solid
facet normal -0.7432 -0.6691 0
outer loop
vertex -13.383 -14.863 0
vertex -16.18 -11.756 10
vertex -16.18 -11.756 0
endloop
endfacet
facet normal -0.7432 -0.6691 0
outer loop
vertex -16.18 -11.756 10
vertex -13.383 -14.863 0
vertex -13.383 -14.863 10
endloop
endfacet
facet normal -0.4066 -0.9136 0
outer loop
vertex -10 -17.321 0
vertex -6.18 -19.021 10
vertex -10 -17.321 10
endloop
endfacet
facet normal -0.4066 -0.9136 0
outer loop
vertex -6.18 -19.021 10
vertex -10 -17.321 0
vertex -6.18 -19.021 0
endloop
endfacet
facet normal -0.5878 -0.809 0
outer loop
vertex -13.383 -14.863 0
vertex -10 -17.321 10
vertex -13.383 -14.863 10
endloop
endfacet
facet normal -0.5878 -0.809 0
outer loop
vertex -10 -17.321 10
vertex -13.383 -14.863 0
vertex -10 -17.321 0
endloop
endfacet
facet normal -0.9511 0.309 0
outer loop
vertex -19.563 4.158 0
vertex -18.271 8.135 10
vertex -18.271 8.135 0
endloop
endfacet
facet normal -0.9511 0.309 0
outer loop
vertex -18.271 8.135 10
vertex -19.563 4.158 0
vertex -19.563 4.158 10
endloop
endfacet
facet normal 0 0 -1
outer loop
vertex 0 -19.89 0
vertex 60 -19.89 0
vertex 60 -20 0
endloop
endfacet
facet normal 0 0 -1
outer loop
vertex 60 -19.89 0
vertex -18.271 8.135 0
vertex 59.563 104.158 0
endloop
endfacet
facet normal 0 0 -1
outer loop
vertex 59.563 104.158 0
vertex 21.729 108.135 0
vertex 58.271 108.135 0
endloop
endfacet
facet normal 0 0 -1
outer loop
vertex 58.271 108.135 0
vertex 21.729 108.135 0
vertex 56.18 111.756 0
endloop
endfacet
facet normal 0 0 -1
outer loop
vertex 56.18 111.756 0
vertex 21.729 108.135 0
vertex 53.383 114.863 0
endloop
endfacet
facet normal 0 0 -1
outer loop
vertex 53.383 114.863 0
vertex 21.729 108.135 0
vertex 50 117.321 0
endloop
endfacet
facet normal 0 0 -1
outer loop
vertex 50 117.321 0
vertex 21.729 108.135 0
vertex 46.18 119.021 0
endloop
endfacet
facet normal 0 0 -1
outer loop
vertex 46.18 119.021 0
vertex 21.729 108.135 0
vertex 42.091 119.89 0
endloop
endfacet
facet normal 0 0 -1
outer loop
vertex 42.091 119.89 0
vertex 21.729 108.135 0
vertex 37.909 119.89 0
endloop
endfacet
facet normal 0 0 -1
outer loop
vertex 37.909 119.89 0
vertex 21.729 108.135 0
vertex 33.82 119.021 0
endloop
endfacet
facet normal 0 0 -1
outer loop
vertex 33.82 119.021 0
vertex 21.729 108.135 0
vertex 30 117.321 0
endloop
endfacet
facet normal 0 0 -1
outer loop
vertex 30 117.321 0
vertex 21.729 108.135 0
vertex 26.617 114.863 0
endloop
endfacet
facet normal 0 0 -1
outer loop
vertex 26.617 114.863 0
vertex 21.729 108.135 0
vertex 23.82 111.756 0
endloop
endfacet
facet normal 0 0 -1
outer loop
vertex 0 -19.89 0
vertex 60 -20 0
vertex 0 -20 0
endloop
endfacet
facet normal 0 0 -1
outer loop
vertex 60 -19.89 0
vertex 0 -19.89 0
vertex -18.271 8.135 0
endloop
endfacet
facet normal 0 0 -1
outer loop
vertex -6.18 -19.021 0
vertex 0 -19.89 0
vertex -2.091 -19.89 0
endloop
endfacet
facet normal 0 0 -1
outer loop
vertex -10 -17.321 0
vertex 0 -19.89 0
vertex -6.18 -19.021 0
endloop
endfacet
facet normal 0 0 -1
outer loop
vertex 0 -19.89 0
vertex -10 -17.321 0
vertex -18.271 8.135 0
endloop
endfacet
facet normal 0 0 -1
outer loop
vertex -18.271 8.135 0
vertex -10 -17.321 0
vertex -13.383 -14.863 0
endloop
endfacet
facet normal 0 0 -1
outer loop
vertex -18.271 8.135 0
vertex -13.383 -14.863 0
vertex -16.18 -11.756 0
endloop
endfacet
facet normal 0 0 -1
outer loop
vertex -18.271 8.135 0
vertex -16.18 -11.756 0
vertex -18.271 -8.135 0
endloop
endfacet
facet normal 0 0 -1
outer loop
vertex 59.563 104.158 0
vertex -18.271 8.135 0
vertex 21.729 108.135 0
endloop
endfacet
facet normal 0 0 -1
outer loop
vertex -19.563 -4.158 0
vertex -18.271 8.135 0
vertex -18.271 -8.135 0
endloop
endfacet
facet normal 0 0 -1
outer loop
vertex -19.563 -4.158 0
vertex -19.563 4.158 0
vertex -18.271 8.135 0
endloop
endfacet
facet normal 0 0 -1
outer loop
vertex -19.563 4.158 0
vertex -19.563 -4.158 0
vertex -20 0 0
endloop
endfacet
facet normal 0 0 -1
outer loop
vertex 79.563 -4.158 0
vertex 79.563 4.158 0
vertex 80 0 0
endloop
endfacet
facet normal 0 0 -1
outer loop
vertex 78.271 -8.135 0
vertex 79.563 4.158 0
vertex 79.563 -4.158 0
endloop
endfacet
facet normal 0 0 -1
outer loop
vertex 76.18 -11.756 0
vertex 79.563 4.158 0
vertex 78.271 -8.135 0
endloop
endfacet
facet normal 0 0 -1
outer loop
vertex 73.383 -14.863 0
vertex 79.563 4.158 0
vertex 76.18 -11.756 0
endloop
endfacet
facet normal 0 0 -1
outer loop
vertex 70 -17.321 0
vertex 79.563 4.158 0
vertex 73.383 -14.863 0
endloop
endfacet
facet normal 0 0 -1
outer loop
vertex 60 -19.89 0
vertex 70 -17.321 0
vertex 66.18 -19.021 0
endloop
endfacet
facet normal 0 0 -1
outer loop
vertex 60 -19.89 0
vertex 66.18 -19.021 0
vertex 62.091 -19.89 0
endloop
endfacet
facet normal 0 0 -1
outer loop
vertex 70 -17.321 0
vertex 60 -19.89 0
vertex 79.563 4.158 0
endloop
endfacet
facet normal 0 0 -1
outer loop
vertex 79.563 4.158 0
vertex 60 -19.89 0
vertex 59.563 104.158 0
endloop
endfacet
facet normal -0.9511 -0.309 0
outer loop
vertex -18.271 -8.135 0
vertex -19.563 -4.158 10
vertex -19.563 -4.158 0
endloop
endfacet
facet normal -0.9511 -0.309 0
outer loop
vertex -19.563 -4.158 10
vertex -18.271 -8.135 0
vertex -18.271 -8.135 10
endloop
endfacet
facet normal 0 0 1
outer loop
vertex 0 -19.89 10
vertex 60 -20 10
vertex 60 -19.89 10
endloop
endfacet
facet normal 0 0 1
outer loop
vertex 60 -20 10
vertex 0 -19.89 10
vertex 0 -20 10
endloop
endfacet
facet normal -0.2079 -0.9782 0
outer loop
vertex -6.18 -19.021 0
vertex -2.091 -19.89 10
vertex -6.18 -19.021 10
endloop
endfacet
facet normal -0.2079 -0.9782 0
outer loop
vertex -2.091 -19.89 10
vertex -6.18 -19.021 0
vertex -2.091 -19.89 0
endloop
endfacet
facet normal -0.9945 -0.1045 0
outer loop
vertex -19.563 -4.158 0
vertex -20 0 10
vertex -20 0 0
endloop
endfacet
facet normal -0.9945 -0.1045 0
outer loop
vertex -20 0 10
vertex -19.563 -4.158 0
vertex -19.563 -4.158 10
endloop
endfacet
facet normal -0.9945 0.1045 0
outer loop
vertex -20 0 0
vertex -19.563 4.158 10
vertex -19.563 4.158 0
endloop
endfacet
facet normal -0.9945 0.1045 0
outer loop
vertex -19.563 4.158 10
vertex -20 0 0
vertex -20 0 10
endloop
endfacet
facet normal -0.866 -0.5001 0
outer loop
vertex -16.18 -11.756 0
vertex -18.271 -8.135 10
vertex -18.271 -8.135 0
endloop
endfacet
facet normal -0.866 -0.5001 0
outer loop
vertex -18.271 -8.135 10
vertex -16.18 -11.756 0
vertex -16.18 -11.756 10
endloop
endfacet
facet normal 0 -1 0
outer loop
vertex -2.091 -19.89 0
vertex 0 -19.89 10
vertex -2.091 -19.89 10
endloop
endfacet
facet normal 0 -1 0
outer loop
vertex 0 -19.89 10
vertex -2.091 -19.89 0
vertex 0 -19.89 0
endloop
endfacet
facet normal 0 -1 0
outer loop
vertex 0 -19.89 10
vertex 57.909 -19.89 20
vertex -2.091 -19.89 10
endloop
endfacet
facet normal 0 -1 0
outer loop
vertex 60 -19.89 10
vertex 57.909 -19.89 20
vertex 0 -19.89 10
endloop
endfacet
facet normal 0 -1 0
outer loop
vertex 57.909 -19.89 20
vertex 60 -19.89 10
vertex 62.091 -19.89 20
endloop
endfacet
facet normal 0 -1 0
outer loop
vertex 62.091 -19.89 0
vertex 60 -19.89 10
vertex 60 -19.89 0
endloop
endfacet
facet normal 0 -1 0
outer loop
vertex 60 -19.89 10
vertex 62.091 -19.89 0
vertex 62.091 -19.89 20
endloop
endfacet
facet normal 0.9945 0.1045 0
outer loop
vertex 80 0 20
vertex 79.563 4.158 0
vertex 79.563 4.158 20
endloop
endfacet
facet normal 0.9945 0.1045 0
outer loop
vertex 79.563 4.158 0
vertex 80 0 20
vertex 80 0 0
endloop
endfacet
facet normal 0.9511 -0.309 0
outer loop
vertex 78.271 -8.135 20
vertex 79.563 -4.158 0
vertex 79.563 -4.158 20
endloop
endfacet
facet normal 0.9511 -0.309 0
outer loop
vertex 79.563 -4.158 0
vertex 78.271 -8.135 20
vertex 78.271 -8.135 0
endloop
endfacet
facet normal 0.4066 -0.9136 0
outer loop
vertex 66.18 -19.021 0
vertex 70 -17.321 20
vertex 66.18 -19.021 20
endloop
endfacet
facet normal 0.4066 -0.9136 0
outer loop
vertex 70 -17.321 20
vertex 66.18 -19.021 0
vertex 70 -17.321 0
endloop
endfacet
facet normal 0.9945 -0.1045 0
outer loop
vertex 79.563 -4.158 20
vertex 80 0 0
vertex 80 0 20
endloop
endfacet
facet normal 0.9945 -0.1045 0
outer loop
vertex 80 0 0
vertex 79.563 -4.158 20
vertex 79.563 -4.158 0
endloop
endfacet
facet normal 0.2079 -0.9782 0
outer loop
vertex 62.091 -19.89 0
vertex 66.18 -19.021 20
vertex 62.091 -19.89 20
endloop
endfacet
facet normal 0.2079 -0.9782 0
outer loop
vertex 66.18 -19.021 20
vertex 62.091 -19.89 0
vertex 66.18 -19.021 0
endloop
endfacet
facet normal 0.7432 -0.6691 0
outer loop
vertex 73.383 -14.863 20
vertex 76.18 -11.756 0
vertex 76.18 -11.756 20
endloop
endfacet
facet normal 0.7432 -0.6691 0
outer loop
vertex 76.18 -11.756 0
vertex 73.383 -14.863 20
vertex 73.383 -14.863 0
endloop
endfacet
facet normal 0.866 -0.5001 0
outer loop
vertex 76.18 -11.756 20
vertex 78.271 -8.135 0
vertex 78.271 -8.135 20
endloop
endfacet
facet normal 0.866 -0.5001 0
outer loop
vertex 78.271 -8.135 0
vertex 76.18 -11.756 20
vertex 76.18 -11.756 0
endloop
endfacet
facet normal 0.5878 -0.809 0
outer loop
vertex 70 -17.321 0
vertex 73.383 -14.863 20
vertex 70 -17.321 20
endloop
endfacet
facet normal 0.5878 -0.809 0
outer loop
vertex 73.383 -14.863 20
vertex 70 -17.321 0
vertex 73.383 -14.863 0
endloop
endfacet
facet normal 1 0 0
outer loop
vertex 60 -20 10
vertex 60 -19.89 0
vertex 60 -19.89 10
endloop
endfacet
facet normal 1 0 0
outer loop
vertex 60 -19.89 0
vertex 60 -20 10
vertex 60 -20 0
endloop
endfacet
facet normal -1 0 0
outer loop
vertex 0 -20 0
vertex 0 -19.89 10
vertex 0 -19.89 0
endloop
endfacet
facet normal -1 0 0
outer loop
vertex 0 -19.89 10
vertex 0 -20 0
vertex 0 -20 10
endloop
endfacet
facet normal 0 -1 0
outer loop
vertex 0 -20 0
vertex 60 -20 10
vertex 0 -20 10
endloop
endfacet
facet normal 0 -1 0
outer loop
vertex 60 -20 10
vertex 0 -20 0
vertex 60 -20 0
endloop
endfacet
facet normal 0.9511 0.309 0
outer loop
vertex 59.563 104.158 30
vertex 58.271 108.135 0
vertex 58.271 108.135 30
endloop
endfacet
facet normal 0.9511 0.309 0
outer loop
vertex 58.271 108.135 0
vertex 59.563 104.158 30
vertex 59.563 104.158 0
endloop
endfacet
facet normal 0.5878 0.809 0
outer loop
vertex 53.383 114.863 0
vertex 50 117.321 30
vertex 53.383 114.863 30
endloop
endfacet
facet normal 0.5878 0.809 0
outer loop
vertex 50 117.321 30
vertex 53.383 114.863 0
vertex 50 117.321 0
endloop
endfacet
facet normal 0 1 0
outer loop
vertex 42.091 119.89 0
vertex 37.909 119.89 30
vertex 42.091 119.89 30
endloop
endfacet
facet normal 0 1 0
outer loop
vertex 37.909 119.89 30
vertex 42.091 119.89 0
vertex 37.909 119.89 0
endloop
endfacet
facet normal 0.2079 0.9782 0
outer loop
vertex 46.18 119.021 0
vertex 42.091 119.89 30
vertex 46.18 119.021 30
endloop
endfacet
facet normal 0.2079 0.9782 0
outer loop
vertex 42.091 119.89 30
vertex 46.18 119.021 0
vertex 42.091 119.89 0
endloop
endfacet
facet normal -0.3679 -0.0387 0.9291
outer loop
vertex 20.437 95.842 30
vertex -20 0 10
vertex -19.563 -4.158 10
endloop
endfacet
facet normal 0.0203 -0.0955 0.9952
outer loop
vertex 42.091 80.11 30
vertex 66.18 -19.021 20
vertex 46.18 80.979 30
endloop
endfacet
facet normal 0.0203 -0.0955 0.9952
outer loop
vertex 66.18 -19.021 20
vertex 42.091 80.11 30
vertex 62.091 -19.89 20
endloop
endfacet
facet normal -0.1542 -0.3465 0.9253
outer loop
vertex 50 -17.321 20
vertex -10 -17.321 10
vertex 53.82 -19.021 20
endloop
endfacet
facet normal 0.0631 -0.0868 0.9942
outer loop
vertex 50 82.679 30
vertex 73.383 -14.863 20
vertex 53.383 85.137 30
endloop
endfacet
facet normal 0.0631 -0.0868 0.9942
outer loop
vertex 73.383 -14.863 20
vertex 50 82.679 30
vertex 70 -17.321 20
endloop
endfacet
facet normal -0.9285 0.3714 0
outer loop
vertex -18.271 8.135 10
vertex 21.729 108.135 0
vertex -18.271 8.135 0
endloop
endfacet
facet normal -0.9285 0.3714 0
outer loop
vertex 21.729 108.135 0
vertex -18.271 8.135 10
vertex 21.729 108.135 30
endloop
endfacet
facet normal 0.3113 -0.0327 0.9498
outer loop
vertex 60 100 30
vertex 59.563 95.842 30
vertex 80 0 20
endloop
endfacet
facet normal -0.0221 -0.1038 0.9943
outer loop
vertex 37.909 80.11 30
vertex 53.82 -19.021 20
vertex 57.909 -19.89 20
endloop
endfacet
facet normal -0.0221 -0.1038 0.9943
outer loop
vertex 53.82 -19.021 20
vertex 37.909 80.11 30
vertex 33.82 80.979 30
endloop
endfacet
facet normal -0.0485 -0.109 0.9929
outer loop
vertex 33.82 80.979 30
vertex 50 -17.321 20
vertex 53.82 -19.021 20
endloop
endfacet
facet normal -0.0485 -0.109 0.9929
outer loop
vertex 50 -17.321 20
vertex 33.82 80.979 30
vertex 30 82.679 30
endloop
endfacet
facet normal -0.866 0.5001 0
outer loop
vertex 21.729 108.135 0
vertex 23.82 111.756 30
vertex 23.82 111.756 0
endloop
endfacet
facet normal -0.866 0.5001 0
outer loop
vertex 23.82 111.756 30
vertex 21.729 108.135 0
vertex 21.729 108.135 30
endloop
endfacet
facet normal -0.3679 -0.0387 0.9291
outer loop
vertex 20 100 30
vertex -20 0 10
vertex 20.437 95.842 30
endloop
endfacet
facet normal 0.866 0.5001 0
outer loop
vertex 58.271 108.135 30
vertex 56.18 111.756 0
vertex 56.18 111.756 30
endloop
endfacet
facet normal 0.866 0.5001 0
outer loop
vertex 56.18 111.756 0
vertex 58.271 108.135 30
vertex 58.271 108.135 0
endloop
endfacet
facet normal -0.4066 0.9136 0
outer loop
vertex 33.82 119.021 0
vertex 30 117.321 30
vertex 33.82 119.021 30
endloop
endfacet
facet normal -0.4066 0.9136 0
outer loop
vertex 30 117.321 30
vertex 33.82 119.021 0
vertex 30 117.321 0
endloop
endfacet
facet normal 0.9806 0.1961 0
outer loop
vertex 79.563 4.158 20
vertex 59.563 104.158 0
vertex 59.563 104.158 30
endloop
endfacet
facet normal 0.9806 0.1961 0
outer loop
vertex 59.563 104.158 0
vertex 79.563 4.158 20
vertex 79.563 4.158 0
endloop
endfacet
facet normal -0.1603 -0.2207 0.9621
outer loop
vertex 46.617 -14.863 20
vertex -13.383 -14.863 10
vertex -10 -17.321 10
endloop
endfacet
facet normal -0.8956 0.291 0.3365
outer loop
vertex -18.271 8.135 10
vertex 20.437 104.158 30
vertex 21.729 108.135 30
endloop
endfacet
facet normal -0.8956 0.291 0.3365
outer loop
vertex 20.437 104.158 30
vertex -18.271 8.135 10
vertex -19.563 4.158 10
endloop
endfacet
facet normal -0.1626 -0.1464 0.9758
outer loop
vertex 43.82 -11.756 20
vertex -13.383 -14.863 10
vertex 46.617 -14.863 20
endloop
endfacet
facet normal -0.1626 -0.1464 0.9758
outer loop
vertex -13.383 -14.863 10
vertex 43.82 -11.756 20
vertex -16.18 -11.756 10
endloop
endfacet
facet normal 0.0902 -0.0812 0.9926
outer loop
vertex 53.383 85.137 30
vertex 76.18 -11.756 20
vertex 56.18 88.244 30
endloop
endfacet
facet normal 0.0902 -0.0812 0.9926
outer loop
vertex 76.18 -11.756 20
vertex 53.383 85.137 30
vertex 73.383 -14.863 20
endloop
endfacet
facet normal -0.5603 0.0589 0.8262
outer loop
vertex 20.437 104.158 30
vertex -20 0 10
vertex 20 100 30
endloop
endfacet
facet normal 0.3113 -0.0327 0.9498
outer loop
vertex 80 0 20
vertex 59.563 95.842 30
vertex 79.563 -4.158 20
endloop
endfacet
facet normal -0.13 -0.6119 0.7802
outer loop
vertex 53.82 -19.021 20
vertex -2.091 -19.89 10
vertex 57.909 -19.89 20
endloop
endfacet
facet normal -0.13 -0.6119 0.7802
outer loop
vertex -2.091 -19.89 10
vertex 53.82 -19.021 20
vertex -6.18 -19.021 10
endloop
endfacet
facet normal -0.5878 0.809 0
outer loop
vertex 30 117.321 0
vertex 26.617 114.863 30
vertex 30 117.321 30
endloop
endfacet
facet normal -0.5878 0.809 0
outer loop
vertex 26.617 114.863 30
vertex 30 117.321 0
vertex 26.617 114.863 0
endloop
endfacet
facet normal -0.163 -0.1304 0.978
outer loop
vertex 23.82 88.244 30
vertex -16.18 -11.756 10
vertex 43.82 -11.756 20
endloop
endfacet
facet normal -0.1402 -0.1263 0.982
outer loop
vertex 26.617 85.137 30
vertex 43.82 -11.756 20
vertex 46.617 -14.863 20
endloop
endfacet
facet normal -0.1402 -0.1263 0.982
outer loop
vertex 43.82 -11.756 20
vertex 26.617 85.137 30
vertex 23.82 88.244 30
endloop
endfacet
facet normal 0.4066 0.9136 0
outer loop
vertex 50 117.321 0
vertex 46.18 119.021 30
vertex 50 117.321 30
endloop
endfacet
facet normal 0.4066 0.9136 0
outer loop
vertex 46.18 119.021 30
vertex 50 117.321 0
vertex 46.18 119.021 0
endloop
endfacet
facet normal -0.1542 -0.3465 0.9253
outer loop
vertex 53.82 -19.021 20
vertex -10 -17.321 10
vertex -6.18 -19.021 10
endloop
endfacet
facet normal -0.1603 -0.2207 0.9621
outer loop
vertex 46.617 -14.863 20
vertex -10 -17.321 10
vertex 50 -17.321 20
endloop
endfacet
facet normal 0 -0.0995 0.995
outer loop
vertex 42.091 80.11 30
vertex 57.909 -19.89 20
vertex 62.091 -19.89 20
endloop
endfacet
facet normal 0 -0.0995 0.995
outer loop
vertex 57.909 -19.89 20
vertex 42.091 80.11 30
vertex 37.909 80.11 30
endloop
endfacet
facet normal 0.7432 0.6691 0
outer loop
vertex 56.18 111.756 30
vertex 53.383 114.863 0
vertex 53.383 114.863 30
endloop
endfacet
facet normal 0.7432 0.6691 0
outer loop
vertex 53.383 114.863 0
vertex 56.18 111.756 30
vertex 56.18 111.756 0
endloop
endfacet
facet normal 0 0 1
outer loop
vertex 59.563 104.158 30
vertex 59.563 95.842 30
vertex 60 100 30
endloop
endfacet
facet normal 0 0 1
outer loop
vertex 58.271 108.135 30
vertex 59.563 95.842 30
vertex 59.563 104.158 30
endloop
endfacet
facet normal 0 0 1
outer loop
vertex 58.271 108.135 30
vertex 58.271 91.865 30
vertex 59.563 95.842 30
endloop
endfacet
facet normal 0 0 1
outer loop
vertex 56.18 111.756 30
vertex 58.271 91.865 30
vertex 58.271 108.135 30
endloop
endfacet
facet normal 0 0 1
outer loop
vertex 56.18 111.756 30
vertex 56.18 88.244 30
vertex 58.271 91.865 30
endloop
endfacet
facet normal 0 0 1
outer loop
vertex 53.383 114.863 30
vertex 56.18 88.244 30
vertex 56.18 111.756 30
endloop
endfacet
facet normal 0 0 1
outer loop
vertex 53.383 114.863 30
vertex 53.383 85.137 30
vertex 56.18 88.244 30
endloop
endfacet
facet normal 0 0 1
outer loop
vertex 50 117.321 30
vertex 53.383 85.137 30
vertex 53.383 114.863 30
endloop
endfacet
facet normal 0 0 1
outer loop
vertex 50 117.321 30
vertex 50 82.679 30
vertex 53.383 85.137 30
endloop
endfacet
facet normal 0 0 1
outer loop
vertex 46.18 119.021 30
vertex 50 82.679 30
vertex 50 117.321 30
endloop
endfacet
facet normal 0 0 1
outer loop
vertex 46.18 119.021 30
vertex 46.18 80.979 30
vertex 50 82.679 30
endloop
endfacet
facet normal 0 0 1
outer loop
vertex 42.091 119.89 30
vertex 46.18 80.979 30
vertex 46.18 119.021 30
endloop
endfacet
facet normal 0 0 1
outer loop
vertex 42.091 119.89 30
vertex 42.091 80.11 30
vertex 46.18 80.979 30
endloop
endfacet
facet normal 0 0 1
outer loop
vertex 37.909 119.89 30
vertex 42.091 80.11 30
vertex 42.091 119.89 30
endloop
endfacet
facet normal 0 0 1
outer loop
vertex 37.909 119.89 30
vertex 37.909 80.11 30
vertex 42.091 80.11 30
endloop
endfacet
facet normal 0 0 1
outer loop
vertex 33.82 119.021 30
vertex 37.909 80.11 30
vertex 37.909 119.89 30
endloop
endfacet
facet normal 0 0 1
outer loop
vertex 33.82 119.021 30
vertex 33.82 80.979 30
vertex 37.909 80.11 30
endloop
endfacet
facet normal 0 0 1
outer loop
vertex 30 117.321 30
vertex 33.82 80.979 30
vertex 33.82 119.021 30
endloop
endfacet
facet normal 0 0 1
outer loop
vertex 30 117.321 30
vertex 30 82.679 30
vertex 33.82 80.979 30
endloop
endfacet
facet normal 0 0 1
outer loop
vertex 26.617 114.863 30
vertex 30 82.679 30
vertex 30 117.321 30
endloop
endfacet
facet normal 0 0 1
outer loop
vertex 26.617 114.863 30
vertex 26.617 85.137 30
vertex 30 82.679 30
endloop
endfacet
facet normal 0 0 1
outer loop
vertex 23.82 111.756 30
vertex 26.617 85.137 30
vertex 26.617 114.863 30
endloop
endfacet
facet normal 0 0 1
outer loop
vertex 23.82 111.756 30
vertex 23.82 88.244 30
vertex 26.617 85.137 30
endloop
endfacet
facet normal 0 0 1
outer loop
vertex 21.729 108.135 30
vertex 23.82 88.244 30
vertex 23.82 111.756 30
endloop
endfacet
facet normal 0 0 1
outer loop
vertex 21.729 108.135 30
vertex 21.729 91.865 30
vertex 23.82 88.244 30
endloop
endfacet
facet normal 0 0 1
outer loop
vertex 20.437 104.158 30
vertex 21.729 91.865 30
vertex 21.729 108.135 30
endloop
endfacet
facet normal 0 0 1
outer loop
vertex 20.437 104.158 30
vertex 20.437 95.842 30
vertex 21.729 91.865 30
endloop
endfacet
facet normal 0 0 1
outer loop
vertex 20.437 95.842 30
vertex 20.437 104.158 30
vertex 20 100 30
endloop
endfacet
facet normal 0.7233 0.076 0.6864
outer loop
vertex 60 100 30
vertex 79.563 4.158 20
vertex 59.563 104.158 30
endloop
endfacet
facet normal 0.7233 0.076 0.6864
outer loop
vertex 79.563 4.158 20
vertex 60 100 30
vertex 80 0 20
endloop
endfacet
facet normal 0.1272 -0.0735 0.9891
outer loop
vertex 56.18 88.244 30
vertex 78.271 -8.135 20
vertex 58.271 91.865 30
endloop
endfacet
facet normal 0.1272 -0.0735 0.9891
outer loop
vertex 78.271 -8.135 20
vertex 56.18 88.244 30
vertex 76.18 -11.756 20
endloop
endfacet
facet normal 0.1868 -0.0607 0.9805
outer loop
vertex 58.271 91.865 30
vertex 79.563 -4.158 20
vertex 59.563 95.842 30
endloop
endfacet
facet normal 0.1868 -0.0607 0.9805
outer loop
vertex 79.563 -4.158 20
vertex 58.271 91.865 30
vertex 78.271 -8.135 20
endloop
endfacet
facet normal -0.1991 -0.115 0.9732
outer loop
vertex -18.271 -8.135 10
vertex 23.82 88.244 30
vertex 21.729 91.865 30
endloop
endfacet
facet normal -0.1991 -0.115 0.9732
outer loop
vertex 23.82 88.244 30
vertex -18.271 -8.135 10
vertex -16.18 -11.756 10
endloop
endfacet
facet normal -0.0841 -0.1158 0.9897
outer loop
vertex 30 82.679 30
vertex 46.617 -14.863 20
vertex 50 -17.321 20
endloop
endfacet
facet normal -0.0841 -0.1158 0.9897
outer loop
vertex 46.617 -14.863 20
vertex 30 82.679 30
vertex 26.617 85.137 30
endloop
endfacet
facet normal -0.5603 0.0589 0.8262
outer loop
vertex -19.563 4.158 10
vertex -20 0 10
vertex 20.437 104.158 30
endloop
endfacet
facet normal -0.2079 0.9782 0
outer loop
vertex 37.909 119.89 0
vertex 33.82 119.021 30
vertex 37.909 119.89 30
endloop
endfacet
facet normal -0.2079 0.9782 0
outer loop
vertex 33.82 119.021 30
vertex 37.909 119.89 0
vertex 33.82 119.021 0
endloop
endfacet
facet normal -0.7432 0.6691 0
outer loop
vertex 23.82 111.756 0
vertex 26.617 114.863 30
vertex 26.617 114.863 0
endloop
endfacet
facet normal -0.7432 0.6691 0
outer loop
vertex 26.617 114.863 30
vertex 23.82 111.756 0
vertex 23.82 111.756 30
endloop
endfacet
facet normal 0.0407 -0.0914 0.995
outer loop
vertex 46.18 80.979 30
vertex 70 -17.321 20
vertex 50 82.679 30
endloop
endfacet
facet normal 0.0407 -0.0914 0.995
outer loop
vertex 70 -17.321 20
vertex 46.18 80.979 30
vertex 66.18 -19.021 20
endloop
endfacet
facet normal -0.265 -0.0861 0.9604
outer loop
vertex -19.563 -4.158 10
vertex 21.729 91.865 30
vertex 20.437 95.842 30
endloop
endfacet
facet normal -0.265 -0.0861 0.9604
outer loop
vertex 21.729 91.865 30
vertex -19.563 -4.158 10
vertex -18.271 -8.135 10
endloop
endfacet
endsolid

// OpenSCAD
module placa_snowboard(grosime, raza, lungime)
{
cylinder(h = grosime, r = raza);

translate ([lungime - 2 * raza, 0, 0])
cylinder(h = grosime, r = raza);
  
   translate ([0, -raza, 0]) cube([lungime - 2 * raza, 2 * raza, grosime]);
}  
    placa_snowboard(grosime = 10, raza = 20, lungime = 100);
//......................................
module podium(grosime, raza, lungime)
{
    hull(){
cylinder(h = grosime, r = raza);

translate ([lungime - 2 * raza, 0, 0])
cylinder(h = 2 * grosime, r = raza);
        translate([(lungime - raza) / 2, lungime, 0])
        cylinder(h = 3 * grosime, r = raza);
  
    }
}  
//..........................................
module placa_snowboard2(grosime, raza, lungime)
{
    hull(){
cylinder(h = grosime, r = raza);

translate ([lungime - 2 * raza, 0, 0])
cylinder(h = 2 * grosime, r = raza);
  
    }
}  
//..........................................
    //placa_snowboard2(grosime = 10, raza = 20, lungime = 100);
podium(grosime = 10, raza = 20, lungime = 100);
